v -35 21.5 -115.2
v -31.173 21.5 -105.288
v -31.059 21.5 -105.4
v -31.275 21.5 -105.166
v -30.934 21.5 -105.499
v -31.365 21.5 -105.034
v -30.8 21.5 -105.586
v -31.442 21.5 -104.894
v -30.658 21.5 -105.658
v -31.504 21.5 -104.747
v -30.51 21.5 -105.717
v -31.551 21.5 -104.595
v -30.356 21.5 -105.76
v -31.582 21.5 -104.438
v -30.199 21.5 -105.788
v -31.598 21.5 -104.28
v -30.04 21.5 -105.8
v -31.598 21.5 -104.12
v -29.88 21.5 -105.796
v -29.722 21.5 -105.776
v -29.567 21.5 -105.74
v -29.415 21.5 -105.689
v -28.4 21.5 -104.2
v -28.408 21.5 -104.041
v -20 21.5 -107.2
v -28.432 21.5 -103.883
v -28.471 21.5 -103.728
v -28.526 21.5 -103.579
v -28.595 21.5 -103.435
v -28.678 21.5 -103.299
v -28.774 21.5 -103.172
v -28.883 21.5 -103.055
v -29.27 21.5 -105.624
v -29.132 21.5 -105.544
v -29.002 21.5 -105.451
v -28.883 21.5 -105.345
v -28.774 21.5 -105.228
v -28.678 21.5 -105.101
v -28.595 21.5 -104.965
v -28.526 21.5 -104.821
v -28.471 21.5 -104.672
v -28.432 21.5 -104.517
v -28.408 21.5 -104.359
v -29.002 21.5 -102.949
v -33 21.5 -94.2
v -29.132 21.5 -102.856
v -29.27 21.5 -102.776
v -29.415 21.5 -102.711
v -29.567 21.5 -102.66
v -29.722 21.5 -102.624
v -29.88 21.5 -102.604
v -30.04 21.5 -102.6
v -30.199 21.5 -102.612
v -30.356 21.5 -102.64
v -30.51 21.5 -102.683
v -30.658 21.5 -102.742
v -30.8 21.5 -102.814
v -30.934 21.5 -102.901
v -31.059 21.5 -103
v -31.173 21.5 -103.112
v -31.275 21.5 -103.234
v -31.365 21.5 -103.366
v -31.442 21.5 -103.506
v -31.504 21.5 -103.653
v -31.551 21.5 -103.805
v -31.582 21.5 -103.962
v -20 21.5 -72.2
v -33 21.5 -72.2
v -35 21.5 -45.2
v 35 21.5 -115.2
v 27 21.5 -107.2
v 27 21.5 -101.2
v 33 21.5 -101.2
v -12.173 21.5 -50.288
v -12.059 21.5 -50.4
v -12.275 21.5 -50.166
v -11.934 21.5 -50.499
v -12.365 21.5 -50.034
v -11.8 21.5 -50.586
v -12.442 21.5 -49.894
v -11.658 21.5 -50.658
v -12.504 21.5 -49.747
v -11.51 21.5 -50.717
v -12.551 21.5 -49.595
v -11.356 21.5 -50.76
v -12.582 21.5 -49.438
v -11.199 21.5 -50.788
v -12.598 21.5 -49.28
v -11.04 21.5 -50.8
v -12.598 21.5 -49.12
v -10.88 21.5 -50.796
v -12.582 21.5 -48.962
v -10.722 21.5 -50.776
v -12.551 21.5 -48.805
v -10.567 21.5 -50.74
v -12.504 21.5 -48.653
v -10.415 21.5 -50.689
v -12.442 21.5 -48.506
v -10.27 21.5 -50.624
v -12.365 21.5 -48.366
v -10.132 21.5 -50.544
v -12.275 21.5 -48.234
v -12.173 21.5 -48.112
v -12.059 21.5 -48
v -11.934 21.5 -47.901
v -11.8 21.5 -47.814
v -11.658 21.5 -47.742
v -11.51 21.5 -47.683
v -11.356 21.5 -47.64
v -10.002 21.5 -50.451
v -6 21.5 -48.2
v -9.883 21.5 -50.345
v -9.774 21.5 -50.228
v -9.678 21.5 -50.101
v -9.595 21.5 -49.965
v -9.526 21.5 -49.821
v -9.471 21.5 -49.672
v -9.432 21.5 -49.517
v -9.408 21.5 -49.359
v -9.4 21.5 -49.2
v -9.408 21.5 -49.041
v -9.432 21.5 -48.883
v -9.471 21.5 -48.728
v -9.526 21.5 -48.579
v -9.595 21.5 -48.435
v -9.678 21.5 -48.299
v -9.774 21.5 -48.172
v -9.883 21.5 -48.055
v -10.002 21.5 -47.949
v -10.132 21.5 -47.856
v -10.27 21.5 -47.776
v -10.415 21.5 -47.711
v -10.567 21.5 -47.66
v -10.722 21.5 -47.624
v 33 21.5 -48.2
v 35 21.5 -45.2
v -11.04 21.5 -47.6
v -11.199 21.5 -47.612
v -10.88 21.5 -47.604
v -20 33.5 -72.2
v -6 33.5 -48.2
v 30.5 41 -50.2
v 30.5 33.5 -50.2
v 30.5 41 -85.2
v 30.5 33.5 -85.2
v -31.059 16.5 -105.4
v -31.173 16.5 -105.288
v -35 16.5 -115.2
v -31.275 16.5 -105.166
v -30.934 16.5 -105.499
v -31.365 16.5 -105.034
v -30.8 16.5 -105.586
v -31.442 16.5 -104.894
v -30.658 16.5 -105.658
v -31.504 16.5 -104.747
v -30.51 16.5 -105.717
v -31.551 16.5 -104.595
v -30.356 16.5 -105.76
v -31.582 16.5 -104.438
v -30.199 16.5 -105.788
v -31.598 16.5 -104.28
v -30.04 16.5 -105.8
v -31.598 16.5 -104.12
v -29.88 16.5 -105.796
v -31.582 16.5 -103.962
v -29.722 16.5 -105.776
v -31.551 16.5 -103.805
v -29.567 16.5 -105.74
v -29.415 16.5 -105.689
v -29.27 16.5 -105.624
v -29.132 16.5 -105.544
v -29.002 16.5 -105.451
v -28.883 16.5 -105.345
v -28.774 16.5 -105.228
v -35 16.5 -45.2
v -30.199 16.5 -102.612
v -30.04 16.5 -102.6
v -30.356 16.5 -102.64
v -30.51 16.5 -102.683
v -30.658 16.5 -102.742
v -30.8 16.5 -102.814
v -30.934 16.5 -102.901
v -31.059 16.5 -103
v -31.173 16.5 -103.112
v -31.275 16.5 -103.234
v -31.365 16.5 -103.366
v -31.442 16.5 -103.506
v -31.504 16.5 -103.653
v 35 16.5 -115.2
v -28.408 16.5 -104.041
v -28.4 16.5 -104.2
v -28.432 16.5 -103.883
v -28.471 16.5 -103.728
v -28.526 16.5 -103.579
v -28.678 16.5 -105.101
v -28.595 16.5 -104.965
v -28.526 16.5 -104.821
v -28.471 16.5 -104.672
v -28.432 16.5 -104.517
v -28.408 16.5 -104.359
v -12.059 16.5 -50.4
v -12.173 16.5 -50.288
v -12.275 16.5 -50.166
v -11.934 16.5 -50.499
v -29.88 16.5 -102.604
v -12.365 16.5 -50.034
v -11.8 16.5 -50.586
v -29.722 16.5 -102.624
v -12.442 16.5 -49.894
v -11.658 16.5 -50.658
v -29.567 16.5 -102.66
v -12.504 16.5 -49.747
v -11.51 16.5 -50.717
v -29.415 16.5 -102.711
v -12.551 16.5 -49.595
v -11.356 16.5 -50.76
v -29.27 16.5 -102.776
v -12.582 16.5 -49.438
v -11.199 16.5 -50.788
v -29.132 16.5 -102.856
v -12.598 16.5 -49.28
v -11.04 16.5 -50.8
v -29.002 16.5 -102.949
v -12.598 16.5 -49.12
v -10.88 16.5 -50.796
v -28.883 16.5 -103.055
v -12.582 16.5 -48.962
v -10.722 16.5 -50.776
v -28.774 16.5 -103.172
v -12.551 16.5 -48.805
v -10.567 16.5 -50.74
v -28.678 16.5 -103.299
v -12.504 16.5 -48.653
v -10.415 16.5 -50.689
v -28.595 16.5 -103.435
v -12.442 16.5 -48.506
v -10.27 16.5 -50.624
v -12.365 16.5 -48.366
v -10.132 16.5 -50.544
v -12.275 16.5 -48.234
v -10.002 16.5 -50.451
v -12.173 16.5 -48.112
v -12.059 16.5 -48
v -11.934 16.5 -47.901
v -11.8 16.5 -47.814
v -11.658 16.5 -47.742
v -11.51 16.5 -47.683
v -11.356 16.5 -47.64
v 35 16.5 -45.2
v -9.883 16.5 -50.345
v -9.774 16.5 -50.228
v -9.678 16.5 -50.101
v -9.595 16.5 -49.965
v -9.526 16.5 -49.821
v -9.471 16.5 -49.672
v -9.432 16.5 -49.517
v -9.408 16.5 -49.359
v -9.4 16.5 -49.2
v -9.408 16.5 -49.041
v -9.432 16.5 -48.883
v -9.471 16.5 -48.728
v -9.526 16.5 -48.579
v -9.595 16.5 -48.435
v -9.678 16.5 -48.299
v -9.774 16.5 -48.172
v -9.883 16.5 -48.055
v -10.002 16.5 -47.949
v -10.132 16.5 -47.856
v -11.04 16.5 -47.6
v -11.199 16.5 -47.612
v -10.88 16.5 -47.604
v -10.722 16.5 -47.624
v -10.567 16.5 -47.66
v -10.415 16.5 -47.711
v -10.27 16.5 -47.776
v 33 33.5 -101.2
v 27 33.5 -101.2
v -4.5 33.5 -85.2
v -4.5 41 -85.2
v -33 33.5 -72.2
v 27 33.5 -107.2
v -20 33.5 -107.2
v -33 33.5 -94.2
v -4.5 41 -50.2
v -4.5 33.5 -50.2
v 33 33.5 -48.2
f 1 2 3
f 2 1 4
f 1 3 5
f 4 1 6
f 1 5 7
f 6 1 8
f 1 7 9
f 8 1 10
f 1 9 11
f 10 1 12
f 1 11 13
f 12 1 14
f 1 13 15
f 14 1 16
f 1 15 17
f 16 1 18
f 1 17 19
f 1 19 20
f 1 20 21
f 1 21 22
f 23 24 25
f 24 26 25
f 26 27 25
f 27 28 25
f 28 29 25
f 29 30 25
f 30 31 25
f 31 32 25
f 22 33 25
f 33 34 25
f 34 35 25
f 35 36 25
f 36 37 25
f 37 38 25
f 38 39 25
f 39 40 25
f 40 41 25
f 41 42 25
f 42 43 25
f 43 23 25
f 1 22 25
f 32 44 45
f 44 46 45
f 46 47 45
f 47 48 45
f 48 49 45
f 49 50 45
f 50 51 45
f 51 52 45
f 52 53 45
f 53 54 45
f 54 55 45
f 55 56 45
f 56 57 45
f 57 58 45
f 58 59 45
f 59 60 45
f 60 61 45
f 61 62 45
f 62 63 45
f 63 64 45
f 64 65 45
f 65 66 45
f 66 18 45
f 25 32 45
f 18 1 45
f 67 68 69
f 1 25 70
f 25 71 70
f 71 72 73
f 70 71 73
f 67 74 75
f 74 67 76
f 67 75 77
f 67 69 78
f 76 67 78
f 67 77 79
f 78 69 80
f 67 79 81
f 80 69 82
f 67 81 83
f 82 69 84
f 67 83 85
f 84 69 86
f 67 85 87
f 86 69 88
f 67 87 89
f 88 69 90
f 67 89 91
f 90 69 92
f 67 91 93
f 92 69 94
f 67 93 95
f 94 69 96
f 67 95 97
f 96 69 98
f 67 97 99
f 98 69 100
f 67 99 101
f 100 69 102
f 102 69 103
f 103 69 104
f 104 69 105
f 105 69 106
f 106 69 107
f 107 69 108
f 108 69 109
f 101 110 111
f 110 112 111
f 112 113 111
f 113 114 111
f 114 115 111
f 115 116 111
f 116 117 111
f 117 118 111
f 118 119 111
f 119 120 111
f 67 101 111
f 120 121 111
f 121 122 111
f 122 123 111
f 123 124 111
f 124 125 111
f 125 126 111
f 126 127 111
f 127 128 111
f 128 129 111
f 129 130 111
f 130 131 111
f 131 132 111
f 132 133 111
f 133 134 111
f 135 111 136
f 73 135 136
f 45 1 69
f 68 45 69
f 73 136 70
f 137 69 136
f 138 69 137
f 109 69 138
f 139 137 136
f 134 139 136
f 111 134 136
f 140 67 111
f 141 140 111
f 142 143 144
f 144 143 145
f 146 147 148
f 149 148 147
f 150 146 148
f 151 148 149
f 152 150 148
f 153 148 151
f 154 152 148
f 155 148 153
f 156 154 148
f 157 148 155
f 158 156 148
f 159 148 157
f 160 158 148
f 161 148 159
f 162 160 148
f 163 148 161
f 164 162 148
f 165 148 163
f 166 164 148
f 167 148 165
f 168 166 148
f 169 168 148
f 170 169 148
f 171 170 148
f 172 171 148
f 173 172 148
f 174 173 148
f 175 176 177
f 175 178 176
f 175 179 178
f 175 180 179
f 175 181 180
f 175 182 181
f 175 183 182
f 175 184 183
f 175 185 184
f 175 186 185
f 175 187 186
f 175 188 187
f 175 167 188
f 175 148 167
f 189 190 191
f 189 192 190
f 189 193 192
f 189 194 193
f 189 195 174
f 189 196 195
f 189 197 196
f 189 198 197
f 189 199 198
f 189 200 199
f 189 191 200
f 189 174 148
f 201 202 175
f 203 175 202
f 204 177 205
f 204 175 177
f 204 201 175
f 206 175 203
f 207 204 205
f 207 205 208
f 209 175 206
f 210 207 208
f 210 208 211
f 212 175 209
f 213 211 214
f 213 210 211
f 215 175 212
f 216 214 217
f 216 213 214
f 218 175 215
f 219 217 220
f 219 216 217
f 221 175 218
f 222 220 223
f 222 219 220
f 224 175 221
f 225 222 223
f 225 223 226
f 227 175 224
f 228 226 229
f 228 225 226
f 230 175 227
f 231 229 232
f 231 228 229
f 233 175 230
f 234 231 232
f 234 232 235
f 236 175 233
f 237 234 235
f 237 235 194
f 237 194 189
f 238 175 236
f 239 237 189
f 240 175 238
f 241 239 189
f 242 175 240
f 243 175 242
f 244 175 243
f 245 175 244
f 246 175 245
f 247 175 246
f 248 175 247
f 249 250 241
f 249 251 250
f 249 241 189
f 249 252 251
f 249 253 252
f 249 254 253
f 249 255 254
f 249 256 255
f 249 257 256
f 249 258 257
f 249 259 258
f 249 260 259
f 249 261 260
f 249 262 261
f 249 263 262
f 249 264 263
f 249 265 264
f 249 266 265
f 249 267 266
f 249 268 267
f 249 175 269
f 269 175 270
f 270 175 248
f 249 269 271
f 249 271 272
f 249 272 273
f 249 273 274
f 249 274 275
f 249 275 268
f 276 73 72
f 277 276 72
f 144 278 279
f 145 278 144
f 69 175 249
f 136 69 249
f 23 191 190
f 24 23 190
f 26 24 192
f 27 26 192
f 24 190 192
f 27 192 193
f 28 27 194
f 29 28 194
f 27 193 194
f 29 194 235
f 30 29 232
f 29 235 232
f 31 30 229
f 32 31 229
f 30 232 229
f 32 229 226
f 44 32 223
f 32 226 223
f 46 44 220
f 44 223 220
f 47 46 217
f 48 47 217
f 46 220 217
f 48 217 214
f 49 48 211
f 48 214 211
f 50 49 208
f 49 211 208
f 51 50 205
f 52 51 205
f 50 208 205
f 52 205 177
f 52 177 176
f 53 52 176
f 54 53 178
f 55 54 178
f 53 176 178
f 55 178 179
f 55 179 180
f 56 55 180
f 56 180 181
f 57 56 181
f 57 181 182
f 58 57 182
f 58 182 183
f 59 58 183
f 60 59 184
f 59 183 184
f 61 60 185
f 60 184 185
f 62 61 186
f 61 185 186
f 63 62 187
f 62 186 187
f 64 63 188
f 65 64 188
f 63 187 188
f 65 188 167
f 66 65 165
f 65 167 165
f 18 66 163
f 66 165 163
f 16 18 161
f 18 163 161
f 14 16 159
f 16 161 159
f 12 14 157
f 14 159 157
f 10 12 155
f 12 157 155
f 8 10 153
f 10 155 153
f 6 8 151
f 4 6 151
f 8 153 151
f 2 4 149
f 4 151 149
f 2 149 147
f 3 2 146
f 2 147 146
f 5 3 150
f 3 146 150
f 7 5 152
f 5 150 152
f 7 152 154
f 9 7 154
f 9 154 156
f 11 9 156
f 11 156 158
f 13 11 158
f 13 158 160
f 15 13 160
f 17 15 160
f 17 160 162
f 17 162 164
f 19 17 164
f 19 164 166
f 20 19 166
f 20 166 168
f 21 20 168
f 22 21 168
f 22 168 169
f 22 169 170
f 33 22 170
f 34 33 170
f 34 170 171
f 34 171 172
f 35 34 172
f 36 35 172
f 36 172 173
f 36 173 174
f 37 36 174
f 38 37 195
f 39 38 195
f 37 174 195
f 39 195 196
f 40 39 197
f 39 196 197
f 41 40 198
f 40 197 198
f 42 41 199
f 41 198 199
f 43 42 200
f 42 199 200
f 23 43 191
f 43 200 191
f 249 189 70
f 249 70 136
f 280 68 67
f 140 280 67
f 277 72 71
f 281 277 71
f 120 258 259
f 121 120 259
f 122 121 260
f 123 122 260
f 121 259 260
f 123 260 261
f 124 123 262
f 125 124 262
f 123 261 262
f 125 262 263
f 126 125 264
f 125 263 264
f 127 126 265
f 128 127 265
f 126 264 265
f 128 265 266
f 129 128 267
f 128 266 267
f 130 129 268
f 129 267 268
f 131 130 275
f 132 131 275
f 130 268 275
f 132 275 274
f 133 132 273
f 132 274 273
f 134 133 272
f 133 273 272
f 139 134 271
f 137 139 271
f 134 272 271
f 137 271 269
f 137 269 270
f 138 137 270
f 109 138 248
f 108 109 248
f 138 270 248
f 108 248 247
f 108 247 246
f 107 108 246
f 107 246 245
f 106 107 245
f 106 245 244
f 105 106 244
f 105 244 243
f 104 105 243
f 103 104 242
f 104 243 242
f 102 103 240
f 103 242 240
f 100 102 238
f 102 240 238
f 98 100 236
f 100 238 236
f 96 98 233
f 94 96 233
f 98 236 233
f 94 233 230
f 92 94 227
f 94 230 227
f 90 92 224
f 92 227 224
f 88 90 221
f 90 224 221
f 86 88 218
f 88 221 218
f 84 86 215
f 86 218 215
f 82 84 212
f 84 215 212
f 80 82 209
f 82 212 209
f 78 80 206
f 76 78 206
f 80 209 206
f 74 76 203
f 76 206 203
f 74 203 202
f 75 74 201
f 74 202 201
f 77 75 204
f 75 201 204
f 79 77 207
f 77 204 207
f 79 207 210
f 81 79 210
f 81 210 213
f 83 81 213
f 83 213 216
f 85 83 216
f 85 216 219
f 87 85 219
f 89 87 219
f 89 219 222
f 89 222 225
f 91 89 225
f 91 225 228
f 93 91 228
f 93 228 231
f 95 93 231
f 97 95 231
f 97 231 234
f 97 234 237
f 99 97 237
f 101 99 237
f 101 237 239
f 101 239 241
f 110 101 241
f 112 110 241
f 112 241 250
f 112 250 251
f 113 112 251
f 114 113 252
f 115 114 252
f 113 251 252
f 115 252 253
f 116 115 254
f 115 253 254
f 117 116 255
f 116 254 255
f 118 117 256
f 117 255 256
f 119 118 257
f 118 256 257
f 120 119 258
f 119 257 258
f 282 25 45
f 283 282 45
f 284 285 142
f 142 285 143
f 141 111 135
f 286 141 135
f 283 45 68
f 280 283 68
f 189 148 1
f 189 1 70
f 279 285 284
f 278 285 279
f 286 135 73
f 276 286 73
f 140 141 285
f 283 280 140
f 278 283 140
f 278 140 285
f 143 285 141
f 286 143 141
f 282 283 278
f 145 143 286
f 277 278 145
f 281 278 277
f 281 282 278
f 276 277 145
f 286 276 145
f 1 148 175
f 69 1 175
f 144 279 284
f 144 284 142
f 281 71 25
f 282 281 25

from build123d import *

# Parameters (mm, degrees)
SKETCH016_W  = 70
SKETCH016_H  = 70
SKETCH016_R  = 1.6
PAD012_DEPTH = 5
PAD013_DEPTH = 12
SKETCH018_W  = 35
SKETCH018_H  = 35
PAD014_DEPTH = 7.5


with BuildPart() as part:
    # Sketch016 → Pad012 (new body)
    with BuildSketch(Plane.XZ):
        Rectangle(SKETCH016_W, SKETCH016_H)
        with Locations((-30, -24)):
            Circle(SKETCH016_R, mode=Mode.SUBTRACT)
        with Locations((-11, 31)):
            Circle(SKETCH016_R, mode=Mode.SUBTRACT)
    extrude(amount=-PAD012_DEPTH)

    # Sketch017 (on Face8 of Pad012) → Pad013 (join)
    with BuildSketch(Plane(origin=(0, 5, 0), x_dir=(1, 0, 0), z_dir=(0, 1, 0))):
        Polygon((-20, 27), (-33, 14), (-33, -8), (-20, -8), (-6, -32), (33, -32), (33, 21), (27, 21), (27, 27), align=None)
    extrude(amount=PAD013_DEPTH)

    # Sketch018 (on Face18 of Pad013) → Pad014 (join)
    with BuildSketch(Plane(origin=(0, 17, 0), x_dir=(1, 0, 0), z_dir=(0, 1, 0))):
        with Locations((13, -12.5)):
            Rectangle(SKETCH018_W, SKETCH018_H)
    extrude(amount=PAD014_DEPTH)


with BuildPart() as part_1:
    # Body010 placement: moved
    add(part.part.moved(Location((0, 16.5, -80.2))))


solid = part_1.part
